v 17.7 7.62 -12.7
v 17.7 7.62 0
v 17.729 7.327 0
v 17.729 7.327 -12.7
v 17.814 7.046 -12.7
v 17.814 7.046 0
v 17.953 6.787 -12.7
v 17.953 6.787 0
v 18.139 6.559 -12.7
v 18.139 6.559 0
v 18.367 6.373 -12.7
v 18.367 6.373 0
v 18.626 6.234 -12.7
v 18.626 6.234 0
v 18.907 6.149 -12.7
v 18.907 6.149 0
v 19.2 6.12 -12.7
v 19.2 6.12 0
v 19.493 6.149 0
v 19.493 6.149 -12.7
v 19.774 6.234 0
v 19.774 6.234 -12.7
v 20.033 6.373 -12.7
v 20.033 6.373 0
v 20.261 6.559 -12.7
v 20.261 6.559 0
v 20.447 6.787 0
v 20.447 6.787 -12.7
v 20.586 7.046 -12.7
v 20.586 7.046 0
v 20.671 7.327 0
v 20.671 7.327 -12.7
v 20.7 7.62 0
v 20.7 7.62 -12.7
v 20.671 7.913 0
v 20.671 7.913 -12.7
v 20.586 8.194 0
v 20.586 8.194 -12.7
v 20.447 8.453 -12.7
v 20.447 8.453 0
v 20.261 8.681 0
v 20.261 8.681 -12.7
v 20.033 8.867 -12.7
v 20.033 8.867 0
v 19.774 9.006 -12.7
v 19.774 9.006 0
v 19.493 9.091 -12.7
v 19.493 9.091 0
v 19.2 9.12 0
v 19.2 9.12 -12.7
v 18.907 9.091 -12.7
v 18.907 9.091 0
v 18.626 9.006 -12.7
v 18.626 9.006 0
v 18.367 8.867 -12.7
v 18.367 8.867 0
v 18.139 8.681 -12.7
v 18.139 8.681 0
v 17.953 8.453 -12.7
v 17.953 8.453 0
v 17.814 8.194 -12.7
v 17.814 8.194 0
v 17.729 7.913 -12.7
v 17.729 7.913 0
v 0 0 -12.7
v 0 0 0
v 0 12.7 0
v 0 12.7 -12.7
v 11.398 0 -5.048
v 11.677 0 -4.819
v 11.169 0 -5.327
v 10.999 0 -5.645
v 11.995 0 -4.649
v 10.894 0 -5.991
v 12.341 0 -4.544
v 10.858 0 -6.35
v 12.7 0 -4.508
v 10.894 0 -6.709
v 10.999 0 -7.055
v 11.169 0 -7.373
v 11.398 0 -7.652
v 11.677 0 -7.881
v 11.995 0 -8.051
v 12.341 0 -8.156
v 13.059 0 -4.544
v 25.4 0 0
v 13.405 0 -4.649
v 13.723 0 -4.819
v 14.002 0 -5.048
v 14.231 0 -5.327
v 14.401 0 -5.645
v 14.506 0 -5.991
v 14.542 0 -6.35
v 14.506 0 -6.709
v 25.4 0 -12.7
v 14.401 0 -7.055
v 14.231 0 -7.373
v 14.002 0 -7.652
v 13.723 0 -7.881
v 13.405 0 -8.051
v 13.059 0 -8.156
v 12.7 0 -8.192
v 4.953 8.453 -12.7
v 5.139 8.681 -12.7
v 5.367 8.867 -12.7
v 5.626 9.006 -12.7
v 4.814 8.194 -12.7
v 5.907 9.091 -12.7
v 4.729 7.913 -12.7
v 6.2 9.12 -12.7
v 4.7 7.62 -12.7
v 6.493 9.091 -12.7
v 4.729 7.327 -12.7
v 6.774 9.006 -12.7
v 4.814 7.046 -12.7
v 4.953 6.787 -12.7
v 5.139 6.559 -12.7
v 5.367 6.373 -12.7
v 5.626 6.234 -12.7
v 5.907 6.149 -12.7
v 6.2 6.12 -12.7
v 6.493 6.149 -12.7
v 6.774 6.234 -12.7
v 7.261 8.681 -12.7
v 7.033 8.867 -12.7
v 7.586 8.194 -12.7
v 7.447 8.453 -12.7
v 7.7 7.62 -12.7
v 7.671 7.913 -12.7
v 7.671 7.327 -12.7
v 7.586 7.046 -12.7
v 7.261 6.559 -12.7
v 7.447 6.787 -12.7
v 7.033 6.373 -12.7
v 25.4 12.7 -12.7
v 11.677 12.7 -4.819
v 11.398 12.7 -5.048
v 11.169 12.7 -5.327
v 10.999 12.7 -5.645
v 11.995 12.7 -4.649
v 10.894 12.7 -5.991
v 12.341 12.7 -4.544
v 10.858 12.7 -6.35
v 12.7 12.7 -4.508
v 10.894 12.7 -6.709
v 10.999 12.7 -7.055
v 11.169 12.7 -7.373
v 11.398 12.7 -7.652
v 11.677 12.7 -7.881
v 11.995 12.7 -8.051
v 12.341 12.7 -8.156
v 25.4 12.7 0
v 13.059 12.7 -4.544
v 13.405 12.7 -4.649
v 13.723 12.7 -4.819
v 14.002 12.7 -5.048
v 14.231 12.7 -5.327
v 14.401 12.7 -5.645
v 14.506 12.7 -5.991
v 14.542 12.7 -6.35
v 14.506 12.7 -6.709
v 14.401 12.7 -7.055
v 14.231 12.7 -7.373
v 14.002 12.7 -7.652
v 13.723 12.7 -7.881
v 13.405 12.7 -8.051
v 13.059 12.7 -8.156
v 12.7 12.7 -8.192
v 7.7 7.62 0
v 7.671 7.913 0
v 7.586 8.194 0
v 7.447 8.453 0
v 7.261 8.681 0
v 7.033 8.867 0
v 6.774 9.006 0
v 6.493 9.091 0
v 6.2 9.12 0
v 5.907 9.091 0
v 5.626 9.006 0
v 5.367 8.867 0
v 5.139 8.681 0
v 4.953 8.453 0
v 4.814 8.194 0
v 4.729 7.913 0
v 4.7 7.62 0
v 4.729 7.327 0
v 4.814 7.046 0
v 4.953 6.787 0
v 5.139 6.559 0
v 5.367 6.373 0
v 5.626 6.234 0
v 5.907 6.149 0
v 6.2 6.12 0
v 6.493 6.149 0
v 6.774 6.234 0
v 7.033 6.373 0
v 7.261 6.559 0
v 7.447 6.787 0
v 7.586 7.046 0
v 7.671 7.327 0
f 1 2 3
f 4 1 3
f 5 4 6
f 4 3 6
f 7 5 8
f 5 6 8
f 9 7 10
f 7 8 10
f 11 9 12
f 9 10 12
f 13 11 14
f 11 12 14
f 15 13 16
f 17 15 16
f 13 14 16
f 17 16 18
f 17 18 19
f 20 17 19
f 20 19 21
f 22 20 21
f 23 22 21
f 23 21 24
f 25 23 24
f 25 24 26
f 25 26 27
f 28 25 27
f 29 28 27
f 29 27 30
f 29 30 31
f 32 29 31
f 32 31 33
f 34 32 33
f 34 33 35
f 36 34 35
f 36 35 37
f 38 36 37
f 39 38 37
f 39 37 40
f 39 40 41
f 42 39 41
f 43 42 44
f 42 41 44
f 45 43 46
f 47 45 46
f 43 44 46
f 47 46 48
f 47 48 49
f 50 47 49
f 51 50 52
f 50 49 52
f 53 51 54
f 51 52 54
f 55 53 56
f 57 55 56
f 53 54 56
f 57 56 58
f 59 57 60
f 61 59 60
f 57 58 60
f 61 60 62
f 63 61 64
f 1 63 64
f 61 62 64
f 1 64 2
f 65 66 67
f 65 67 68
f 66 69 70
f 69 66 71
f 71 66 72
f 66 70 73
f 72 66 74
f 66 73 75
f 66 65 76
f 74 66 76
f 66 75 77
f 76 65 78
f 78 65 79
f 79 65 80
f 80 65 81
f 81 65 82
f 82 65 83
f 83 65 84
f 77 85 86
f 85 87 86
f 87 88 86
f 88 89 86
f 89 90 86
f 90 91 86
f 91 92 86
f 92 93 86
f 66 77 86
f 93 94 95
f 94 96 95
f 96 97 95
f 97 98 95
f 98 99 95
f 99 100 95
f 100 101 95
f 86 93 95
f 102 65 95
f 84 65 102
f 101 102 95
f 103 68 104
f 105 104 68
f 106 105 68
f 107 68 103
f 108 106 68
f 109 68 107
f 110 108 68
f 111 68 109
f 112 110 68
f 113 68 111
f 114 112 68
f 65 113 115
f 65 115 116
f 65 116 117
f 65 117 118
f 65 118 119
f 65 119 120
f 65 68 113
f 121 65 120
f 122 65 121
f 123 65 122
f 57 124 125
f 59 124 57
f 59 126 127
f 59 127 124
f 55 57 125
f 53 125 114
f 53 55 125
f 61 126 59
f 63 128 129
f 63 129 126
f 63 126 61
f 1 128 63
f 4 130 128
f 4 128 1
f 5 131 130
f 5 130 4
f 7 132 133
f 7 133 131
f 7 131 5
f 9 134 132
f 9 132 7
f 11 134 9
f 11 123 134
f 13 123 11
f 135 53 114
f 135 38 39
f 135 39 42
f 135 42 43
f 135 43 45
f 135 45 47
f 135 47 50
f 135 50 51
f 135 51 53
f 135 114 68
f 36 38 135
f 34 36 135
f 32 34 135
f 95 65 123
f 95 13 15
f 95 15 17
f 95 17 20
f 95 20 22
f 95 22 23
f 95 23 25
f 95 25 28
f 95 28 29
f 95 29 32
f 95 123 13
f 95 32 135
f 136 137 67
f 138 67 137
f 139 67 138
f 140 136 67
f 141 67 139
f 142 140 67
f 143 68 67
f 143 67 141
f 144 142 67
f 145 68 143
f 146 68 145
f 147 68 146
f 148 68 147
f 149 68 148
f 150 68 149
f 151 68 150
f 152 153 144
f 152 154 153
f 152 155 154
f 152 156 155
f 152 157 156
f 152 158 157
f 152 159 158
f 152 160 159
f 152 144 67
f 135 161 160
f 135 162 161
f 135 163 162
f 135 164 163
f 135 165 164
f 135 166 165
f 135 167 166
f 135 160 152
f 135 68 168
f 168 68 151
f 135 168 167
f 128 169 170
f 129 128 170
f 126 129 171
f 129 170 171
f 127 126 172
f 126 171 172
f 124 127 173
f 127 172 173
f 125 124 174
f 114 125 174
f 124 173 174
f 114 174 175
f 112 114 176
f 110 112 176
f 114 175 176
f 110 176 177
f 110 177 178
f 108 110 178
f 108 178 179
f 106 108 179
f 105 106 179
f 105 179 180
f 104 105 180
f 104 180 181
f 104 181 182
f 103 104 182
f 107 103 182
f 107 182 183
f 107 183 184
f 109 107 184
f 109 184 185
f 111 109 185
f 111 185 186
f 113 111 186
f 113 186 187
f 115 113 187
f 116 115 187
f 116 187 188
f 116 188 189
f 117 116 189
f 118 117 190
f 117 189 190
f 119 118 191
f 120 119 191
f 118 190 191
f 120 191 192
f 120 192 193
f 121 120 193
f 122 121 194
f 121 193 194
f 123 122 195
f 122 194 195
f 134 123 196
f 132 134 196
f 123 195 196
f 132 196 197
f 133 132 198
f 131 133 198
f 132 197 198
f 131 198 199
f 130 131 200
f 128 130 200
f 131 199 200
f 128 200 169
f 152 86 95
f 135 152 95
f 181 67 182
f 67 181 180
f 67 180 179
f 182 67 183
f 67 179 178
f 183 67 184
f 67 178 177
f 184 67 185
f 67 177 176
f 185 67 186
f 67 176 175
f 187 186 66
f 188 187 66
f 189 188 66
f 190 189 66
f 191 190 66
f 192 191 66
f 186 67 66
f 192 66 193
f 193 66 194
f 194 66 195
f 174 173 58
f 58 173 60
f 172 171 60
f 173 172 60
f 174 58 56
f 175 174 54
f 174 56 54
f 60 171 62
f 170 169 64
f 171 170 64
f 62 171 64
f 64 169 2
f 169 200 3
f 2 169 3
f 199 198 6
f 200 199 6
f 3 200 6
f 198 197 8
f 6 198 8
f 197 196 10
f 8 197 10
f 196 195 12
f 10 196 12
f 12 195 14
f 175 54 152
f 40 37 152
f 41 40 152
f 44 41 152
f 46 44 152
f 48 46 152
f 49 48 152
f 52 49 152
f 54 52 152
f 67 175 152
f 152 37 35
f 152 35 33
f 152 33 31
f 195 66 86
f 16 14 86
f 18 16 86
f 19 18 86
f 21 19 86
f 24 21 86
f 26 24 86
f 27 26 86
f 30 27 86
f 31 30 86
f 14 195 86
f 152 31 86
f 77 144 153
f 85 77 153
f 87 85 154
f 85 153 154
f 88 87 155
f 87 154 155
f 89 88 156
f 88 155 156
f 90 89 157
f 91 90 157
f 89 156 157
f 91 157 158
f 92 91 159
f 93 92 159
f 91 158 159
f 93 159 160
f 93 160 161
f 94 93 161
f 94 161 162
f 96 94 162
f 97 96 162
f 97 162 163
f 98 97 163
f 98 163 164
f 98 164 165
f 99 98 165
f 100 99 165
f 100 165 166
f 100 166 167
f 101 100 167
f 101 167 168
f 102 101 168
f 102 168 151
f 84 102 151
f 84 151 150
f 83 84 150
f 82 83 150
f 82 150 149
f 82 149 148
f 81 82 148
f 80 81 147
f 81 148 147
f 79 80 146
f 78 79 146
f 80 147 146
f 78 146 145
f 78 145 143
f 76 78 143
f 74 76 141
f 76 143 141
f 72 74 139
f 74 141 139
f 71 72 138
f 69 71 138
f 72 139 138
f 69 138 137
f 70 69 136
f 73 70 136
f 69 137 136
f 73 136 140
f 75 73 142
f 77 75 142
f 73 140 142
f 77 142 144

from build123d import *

# Parameters (mm, degrees)
SKETCH1_W           = 25.4
SKETCH1_H           = 12.7
BOSS_EXTRUDE1_DEPTH = 12.7
SKETCH2_R           = 1.5
CUT_EXTRUDE1_DEPTH  = 32.108519733
SKETCH3_R           = 1.8415
CUT_EXTRUDE2_DEPTH  = 32.108519733


with BuildPart() as part:
    # Sketch1 → Boss-Extrude1 (new body)
    with BuildSketch(Plane(origin=(0, 0, 0), x_dir=(1, 0, 0), z_dir=(0, 1, 0))):
        with Locations((12.7, 6.35)):
            Rectangle(SKETCH1_W, SKETCH1_H)
    extrude(amount=BOSS_EXTRUDE1_DEPTH)

    # Sketch2 → Cut-Extrude1 (cut, through all)
    with BuildSketch(Plane.XY):
        with Locations((6.2, 7.62)):
            Circle(SKETCH2_R)
        with Locations(Location((19.2, 7.62, 0), (0, 0, 180))):
            Circle(SKETCH2_R)
    extrude(amount=-CUT_EXTRUDE1_DEPTH, mode=Mode.SUBTRACT)

    # Sketch3 → Cut-Extrude2 (cut, through all)
    with BuildSketch(Plane(origin=(0, 12.7, 0), x_dir=(1, 0, 0), z_dir=(0, 1, 0))):
        with Locations(Location((12.7, 6.35, 0), (0, 0, 270))):
            Circle(SKETCH3_R)
    extrude(amount=-CUT_EXTRUDE2_DEPTH, mode=Mode.SUBTRACT)


solid = part.part
